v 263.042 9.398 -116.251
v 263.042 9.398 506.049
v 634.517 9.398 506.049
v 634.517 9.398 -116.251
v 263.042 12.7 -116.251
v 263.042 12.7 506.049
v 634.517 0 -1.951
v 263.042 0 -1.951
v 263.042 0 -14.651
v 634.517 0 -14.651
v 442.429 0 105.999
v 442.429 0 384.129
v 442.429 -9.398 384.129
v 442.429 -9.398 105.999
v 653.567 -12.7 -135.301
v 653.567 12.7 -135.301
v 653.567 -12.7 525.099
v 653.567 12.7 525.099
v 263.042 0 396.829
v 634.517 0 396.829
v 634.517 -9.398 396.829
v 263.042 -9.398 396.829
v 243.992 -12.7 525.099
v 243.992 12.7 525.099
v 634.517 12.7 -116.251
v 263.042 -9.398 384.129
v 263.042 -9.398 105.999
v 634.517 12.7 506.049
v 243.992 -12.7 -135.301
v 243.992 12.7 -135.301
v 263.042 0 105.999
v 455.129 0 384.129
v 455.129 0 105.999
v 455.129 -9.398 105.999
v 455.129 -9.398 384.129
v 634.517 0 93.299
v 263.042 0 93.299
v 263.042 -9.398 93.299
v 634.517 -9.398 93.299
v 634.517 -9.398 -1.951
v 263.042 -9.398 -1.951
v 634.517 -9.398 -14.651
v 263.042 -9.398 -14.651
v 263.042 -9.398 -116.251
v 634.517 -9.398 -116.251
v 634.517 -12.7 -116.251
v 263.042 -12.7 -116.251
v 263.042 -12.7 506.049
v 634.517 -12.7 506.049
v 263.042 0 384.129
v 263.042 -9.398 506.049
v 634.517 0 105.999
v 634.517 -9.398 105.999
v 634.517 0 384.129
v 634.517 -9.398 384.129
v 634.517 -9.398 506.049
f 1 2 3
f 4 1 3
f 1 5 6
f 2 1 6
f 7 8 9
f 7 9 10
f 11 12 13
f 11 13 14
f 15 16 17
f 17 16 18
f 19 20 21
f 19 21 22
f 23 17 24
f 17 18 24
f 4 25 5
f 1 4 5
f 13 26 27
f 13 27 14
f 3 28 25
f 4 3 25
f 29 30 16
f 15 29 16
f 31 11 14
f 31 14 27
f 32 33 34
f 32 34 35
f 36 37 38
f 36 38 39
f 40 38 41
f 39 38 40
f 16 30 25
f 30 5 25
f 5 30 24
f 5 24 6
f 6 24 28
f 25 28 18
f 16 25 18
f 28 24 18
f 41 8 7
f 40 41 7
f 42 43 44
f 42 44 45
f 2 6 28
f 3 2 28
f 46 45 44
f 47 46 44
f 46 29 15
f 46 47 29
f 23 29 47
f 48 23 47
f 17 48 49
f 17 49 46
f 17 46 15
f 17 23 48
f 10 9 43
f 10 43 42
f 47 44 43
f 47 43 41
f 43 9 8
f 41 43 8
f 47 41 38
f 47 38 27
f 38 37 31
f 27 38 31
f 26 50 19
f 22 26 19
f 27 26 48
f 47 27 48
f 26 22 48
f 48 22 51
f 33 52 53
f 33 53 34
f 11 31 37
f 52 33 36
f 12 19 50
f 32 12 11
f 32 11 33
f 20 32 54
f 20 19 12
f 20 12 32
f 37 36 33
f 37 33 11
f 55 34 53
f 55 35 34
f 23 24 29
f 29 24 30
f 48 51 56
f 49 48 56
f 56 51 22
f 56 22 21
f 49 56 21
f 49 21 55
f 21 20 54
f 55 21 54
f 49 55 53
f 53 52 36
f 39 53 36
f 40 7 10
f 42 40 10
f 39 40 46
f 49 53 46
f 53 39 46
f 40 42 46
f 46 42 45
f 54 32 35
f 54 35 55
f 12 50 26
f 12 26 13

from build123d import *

# Parameters (mm, degrees)
F1_DEPTH      = 12.7
F1_DEPTH_BACK = 12.7
F0_W          = 371.475
F0_H          = 622.3
F2_DEPTH      = 9.398
F2_DEPTH_BACK = 9.398
F3_W          = 371.475
F3_H          = 12.7
F4_DEPTH      = 12.7


# Not quite as in the source:
# - a feature names something its author has since deleted; it is built from what else it names


with BuildPart() as f1:
    # F0 (on Front) → F1 (new body, two sides)
    with BuildSketch(Plane.XZ) as f1_sk:
        Polygon((263.0418609804, 506.0493900317), (634.5168609804, 506.0493900317), (653.5668609804, 525.0993900317), (243.9918609804, 525.0993900317), align=None)
        Polygon((653.5668609804, 525.0993900317), (634.5168609804, 506.0493900317), (634.5168609804, -116.2506099683), (653.5668609804, -135.3006099683), align=None)
        Polygon((653.5668609804, -135.3006099683), (634.5168609804, -116.2506099683), (263.0418609804, -116.2506099683), (243.9918609804, -135.3006099683), align=None)
        Polygon((263.0418609804, -116.2506099683), (263.0418609804, 506.0493900317), (243.9918609804, 525.0993900317), (243.9918609804, -135.3006099683), align=None)
    extrude(amount=-F1_DEPTH)
    extrude(f1_sk.sketch, amount=F1_DEPTH_BACK)

    # F0 (on Front) → F2 (join, two sides)
    with BuildSketch(Plane.XZ) as f2_sk:
        Polygon((653.5668609804, 525.0993900317), (634.5168609804, 506.0493900317), (634.5168609804, -116.2506099683), (653.5668609804, -135.3006099683), align=None)
        Polygon((263.0418609804, 506.0493900317), (634.5168609804, 506.0493900317), (653.5668609804, 525.0993900317), (243.9918609804, 525.0993900317), align=None)
        Polygon((653.5668609804, -135.3006099683), (634.5168609804, -116.2506099683), (263.0418609804, -116.2506099683), (243.9918609804, -135.3006099683), align=None)
        with Locations((448.7793609804, 194.8993900317)):
            Rectangle(F0_W, F0_H)
        Polygon((263.0418609804, -116.2506099683), (263.0418609804, 506.0493900317), (243.9918609804, 525.0993900317), (243.9918609804, -135.3006099683), align=None)
    extrude(amount=-F2_DEPTH)
    extrude(f2_sk.sketch, amount=F2_DEPTH_BACK)

    # F3 (on face) → F4 (cut)
    with BuildSketch(Plane.XZ):
        Polygon((455.1293609804, 105.9993900317), (455.1293609804, 384.1293900317), (634.5168609804, 384.1293900317), (634.5168609804, 396.8293900317), (263.0418609804, 396.8293900317), (263.0418609804, 384.1293900317), (442.4293609804, 384.1293900317), (442.4293609804, 105.9993900317), (263.0418609804, 105.9993900317), (263.0418609804, 93.2993900317), (634.5168609804, 93.2993900317), (634.5168609804, 105.9993900317), align=None)
        with Locations((448.7793609804, -8.3006099683)):
            Rectangle(F3_W, F3_H)
    extrude(amount=F4_DEPTH, mode=Mode.SUBTRACT)


solid = f1.part
